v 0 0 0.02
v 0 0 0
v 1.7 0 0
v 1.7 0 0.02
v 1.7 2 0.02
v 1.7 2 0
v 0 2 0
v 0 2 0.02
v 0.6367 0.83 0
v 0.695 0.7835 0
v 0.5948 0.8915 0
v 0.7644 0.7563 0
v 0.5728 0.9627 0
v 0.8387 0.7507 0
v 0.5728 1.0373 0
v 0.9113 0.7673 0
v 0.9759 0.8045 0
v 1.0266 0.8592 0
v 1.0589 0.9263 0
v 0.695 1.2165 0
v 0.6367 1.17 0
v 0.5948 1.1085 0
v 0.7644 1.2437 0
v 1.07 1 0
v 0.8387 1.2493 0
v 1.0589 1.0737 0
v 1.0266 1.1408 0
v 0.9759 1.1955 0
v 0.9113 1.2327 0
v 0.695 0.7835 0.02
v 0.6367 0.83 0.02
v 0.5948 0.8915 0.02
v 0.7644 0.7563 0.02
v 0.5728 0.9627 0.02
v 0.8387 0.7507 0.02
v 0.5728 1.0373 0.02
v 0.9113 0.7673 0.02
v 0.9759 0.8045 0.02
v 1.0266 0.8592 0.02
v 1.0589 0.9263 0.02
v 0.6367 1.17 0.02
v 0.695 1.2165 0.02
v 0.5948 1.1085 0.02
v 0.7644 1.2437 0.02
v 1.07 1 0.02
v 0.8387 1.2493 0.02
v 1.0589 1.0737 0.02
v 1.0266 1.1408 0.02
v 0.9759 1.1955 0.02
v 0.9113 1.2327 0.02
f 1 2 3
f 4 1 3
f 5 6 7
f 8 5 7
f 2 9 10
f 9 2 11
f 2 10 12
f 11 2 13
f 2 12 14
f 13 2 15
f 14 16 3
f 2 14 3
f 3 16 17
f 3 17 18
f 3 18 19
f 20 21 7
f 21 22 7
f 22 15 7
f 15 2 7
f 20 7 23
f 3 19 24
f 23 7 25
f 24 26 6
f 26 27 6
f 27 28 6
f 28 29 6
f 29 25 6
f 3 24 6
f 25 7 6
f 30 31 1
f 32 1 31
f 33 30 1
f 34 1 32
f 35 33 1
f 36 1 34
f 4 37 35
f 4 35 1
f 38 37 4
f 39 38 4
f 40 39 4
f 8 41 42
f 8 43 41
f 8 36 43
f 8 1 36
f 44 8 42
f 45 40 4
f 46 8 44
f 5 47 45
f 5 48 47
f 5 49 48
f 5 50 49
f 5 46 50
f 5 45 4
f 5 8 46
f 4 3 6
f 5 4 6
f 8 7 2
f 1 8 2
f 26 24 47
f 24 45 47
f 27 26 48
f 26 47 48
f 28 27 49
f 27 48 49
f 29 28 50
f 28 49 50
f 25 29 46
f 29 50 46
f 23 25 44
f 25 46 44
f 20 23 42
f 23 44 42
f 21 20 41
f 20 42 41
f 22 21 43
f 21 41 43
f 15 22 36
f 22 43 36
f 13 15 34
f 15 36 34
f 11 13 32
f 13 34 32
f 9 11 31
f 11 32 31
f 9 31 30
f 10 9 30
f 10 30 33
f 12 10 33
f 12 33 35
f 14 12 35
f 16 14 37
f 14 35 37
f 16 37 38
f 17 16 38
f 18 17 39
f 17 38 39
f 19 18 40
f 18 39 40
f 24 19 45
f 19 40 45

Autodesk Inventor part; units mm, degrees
ref_plane "YZ Plane" through (0, 0, 0) normal (1, 0, 0) x (0, 1, 0)
ref_plane "XZ Plane" through (0, 0, 0) normal (0, 1, 0) x (-1, 0, 0)
ref_plane "XY Plane" through (0, 0, 0) normal (0, 0, 1) x (1, 0, 0)
sketch "Sketch1" plane through (0, 0, 0) normal (0, 0, 1) x (1, 0, 0)
  line L0 (0, 0) -> (1.7, 0)
  line L1 (1.7, 0) -> (1.7, 2)
  line L2 (1.7, 2) -> (0, 2)
  line L3 (0, 2) -> (0, 0)
  dimension "d0" = 2
  dimension "d1" = 1.7
extrude "Extrusion1" add sketch "Sketch1" along normal blind 0.02
sketch "Sketch2" plane through (0, 0, 0.02) normal (0, 0, 1) x (1, 0, 0)
  line L0 (0, 2) -> (0, 0) projected
  line L1 (0, 2) -> (1.64, 2)
  line L2 (1.64, 2) -> (1.64, 0)
  line L3 (0, 0) -> (0, 2)
  circle A0 centre (0.82, 1) radius 0.25
  line L4 (0, 0) -> (1.64, 0)
  dimension "d9" = 0.5
  dimension "d10" = 1.64
  dimension "d11" = 2
extrude "Extrusion2" cut sketch "Sketch2" against normal through all contours A0
properties part number "Placa gatilho" material "Liga de Nickel-Copper 400"
